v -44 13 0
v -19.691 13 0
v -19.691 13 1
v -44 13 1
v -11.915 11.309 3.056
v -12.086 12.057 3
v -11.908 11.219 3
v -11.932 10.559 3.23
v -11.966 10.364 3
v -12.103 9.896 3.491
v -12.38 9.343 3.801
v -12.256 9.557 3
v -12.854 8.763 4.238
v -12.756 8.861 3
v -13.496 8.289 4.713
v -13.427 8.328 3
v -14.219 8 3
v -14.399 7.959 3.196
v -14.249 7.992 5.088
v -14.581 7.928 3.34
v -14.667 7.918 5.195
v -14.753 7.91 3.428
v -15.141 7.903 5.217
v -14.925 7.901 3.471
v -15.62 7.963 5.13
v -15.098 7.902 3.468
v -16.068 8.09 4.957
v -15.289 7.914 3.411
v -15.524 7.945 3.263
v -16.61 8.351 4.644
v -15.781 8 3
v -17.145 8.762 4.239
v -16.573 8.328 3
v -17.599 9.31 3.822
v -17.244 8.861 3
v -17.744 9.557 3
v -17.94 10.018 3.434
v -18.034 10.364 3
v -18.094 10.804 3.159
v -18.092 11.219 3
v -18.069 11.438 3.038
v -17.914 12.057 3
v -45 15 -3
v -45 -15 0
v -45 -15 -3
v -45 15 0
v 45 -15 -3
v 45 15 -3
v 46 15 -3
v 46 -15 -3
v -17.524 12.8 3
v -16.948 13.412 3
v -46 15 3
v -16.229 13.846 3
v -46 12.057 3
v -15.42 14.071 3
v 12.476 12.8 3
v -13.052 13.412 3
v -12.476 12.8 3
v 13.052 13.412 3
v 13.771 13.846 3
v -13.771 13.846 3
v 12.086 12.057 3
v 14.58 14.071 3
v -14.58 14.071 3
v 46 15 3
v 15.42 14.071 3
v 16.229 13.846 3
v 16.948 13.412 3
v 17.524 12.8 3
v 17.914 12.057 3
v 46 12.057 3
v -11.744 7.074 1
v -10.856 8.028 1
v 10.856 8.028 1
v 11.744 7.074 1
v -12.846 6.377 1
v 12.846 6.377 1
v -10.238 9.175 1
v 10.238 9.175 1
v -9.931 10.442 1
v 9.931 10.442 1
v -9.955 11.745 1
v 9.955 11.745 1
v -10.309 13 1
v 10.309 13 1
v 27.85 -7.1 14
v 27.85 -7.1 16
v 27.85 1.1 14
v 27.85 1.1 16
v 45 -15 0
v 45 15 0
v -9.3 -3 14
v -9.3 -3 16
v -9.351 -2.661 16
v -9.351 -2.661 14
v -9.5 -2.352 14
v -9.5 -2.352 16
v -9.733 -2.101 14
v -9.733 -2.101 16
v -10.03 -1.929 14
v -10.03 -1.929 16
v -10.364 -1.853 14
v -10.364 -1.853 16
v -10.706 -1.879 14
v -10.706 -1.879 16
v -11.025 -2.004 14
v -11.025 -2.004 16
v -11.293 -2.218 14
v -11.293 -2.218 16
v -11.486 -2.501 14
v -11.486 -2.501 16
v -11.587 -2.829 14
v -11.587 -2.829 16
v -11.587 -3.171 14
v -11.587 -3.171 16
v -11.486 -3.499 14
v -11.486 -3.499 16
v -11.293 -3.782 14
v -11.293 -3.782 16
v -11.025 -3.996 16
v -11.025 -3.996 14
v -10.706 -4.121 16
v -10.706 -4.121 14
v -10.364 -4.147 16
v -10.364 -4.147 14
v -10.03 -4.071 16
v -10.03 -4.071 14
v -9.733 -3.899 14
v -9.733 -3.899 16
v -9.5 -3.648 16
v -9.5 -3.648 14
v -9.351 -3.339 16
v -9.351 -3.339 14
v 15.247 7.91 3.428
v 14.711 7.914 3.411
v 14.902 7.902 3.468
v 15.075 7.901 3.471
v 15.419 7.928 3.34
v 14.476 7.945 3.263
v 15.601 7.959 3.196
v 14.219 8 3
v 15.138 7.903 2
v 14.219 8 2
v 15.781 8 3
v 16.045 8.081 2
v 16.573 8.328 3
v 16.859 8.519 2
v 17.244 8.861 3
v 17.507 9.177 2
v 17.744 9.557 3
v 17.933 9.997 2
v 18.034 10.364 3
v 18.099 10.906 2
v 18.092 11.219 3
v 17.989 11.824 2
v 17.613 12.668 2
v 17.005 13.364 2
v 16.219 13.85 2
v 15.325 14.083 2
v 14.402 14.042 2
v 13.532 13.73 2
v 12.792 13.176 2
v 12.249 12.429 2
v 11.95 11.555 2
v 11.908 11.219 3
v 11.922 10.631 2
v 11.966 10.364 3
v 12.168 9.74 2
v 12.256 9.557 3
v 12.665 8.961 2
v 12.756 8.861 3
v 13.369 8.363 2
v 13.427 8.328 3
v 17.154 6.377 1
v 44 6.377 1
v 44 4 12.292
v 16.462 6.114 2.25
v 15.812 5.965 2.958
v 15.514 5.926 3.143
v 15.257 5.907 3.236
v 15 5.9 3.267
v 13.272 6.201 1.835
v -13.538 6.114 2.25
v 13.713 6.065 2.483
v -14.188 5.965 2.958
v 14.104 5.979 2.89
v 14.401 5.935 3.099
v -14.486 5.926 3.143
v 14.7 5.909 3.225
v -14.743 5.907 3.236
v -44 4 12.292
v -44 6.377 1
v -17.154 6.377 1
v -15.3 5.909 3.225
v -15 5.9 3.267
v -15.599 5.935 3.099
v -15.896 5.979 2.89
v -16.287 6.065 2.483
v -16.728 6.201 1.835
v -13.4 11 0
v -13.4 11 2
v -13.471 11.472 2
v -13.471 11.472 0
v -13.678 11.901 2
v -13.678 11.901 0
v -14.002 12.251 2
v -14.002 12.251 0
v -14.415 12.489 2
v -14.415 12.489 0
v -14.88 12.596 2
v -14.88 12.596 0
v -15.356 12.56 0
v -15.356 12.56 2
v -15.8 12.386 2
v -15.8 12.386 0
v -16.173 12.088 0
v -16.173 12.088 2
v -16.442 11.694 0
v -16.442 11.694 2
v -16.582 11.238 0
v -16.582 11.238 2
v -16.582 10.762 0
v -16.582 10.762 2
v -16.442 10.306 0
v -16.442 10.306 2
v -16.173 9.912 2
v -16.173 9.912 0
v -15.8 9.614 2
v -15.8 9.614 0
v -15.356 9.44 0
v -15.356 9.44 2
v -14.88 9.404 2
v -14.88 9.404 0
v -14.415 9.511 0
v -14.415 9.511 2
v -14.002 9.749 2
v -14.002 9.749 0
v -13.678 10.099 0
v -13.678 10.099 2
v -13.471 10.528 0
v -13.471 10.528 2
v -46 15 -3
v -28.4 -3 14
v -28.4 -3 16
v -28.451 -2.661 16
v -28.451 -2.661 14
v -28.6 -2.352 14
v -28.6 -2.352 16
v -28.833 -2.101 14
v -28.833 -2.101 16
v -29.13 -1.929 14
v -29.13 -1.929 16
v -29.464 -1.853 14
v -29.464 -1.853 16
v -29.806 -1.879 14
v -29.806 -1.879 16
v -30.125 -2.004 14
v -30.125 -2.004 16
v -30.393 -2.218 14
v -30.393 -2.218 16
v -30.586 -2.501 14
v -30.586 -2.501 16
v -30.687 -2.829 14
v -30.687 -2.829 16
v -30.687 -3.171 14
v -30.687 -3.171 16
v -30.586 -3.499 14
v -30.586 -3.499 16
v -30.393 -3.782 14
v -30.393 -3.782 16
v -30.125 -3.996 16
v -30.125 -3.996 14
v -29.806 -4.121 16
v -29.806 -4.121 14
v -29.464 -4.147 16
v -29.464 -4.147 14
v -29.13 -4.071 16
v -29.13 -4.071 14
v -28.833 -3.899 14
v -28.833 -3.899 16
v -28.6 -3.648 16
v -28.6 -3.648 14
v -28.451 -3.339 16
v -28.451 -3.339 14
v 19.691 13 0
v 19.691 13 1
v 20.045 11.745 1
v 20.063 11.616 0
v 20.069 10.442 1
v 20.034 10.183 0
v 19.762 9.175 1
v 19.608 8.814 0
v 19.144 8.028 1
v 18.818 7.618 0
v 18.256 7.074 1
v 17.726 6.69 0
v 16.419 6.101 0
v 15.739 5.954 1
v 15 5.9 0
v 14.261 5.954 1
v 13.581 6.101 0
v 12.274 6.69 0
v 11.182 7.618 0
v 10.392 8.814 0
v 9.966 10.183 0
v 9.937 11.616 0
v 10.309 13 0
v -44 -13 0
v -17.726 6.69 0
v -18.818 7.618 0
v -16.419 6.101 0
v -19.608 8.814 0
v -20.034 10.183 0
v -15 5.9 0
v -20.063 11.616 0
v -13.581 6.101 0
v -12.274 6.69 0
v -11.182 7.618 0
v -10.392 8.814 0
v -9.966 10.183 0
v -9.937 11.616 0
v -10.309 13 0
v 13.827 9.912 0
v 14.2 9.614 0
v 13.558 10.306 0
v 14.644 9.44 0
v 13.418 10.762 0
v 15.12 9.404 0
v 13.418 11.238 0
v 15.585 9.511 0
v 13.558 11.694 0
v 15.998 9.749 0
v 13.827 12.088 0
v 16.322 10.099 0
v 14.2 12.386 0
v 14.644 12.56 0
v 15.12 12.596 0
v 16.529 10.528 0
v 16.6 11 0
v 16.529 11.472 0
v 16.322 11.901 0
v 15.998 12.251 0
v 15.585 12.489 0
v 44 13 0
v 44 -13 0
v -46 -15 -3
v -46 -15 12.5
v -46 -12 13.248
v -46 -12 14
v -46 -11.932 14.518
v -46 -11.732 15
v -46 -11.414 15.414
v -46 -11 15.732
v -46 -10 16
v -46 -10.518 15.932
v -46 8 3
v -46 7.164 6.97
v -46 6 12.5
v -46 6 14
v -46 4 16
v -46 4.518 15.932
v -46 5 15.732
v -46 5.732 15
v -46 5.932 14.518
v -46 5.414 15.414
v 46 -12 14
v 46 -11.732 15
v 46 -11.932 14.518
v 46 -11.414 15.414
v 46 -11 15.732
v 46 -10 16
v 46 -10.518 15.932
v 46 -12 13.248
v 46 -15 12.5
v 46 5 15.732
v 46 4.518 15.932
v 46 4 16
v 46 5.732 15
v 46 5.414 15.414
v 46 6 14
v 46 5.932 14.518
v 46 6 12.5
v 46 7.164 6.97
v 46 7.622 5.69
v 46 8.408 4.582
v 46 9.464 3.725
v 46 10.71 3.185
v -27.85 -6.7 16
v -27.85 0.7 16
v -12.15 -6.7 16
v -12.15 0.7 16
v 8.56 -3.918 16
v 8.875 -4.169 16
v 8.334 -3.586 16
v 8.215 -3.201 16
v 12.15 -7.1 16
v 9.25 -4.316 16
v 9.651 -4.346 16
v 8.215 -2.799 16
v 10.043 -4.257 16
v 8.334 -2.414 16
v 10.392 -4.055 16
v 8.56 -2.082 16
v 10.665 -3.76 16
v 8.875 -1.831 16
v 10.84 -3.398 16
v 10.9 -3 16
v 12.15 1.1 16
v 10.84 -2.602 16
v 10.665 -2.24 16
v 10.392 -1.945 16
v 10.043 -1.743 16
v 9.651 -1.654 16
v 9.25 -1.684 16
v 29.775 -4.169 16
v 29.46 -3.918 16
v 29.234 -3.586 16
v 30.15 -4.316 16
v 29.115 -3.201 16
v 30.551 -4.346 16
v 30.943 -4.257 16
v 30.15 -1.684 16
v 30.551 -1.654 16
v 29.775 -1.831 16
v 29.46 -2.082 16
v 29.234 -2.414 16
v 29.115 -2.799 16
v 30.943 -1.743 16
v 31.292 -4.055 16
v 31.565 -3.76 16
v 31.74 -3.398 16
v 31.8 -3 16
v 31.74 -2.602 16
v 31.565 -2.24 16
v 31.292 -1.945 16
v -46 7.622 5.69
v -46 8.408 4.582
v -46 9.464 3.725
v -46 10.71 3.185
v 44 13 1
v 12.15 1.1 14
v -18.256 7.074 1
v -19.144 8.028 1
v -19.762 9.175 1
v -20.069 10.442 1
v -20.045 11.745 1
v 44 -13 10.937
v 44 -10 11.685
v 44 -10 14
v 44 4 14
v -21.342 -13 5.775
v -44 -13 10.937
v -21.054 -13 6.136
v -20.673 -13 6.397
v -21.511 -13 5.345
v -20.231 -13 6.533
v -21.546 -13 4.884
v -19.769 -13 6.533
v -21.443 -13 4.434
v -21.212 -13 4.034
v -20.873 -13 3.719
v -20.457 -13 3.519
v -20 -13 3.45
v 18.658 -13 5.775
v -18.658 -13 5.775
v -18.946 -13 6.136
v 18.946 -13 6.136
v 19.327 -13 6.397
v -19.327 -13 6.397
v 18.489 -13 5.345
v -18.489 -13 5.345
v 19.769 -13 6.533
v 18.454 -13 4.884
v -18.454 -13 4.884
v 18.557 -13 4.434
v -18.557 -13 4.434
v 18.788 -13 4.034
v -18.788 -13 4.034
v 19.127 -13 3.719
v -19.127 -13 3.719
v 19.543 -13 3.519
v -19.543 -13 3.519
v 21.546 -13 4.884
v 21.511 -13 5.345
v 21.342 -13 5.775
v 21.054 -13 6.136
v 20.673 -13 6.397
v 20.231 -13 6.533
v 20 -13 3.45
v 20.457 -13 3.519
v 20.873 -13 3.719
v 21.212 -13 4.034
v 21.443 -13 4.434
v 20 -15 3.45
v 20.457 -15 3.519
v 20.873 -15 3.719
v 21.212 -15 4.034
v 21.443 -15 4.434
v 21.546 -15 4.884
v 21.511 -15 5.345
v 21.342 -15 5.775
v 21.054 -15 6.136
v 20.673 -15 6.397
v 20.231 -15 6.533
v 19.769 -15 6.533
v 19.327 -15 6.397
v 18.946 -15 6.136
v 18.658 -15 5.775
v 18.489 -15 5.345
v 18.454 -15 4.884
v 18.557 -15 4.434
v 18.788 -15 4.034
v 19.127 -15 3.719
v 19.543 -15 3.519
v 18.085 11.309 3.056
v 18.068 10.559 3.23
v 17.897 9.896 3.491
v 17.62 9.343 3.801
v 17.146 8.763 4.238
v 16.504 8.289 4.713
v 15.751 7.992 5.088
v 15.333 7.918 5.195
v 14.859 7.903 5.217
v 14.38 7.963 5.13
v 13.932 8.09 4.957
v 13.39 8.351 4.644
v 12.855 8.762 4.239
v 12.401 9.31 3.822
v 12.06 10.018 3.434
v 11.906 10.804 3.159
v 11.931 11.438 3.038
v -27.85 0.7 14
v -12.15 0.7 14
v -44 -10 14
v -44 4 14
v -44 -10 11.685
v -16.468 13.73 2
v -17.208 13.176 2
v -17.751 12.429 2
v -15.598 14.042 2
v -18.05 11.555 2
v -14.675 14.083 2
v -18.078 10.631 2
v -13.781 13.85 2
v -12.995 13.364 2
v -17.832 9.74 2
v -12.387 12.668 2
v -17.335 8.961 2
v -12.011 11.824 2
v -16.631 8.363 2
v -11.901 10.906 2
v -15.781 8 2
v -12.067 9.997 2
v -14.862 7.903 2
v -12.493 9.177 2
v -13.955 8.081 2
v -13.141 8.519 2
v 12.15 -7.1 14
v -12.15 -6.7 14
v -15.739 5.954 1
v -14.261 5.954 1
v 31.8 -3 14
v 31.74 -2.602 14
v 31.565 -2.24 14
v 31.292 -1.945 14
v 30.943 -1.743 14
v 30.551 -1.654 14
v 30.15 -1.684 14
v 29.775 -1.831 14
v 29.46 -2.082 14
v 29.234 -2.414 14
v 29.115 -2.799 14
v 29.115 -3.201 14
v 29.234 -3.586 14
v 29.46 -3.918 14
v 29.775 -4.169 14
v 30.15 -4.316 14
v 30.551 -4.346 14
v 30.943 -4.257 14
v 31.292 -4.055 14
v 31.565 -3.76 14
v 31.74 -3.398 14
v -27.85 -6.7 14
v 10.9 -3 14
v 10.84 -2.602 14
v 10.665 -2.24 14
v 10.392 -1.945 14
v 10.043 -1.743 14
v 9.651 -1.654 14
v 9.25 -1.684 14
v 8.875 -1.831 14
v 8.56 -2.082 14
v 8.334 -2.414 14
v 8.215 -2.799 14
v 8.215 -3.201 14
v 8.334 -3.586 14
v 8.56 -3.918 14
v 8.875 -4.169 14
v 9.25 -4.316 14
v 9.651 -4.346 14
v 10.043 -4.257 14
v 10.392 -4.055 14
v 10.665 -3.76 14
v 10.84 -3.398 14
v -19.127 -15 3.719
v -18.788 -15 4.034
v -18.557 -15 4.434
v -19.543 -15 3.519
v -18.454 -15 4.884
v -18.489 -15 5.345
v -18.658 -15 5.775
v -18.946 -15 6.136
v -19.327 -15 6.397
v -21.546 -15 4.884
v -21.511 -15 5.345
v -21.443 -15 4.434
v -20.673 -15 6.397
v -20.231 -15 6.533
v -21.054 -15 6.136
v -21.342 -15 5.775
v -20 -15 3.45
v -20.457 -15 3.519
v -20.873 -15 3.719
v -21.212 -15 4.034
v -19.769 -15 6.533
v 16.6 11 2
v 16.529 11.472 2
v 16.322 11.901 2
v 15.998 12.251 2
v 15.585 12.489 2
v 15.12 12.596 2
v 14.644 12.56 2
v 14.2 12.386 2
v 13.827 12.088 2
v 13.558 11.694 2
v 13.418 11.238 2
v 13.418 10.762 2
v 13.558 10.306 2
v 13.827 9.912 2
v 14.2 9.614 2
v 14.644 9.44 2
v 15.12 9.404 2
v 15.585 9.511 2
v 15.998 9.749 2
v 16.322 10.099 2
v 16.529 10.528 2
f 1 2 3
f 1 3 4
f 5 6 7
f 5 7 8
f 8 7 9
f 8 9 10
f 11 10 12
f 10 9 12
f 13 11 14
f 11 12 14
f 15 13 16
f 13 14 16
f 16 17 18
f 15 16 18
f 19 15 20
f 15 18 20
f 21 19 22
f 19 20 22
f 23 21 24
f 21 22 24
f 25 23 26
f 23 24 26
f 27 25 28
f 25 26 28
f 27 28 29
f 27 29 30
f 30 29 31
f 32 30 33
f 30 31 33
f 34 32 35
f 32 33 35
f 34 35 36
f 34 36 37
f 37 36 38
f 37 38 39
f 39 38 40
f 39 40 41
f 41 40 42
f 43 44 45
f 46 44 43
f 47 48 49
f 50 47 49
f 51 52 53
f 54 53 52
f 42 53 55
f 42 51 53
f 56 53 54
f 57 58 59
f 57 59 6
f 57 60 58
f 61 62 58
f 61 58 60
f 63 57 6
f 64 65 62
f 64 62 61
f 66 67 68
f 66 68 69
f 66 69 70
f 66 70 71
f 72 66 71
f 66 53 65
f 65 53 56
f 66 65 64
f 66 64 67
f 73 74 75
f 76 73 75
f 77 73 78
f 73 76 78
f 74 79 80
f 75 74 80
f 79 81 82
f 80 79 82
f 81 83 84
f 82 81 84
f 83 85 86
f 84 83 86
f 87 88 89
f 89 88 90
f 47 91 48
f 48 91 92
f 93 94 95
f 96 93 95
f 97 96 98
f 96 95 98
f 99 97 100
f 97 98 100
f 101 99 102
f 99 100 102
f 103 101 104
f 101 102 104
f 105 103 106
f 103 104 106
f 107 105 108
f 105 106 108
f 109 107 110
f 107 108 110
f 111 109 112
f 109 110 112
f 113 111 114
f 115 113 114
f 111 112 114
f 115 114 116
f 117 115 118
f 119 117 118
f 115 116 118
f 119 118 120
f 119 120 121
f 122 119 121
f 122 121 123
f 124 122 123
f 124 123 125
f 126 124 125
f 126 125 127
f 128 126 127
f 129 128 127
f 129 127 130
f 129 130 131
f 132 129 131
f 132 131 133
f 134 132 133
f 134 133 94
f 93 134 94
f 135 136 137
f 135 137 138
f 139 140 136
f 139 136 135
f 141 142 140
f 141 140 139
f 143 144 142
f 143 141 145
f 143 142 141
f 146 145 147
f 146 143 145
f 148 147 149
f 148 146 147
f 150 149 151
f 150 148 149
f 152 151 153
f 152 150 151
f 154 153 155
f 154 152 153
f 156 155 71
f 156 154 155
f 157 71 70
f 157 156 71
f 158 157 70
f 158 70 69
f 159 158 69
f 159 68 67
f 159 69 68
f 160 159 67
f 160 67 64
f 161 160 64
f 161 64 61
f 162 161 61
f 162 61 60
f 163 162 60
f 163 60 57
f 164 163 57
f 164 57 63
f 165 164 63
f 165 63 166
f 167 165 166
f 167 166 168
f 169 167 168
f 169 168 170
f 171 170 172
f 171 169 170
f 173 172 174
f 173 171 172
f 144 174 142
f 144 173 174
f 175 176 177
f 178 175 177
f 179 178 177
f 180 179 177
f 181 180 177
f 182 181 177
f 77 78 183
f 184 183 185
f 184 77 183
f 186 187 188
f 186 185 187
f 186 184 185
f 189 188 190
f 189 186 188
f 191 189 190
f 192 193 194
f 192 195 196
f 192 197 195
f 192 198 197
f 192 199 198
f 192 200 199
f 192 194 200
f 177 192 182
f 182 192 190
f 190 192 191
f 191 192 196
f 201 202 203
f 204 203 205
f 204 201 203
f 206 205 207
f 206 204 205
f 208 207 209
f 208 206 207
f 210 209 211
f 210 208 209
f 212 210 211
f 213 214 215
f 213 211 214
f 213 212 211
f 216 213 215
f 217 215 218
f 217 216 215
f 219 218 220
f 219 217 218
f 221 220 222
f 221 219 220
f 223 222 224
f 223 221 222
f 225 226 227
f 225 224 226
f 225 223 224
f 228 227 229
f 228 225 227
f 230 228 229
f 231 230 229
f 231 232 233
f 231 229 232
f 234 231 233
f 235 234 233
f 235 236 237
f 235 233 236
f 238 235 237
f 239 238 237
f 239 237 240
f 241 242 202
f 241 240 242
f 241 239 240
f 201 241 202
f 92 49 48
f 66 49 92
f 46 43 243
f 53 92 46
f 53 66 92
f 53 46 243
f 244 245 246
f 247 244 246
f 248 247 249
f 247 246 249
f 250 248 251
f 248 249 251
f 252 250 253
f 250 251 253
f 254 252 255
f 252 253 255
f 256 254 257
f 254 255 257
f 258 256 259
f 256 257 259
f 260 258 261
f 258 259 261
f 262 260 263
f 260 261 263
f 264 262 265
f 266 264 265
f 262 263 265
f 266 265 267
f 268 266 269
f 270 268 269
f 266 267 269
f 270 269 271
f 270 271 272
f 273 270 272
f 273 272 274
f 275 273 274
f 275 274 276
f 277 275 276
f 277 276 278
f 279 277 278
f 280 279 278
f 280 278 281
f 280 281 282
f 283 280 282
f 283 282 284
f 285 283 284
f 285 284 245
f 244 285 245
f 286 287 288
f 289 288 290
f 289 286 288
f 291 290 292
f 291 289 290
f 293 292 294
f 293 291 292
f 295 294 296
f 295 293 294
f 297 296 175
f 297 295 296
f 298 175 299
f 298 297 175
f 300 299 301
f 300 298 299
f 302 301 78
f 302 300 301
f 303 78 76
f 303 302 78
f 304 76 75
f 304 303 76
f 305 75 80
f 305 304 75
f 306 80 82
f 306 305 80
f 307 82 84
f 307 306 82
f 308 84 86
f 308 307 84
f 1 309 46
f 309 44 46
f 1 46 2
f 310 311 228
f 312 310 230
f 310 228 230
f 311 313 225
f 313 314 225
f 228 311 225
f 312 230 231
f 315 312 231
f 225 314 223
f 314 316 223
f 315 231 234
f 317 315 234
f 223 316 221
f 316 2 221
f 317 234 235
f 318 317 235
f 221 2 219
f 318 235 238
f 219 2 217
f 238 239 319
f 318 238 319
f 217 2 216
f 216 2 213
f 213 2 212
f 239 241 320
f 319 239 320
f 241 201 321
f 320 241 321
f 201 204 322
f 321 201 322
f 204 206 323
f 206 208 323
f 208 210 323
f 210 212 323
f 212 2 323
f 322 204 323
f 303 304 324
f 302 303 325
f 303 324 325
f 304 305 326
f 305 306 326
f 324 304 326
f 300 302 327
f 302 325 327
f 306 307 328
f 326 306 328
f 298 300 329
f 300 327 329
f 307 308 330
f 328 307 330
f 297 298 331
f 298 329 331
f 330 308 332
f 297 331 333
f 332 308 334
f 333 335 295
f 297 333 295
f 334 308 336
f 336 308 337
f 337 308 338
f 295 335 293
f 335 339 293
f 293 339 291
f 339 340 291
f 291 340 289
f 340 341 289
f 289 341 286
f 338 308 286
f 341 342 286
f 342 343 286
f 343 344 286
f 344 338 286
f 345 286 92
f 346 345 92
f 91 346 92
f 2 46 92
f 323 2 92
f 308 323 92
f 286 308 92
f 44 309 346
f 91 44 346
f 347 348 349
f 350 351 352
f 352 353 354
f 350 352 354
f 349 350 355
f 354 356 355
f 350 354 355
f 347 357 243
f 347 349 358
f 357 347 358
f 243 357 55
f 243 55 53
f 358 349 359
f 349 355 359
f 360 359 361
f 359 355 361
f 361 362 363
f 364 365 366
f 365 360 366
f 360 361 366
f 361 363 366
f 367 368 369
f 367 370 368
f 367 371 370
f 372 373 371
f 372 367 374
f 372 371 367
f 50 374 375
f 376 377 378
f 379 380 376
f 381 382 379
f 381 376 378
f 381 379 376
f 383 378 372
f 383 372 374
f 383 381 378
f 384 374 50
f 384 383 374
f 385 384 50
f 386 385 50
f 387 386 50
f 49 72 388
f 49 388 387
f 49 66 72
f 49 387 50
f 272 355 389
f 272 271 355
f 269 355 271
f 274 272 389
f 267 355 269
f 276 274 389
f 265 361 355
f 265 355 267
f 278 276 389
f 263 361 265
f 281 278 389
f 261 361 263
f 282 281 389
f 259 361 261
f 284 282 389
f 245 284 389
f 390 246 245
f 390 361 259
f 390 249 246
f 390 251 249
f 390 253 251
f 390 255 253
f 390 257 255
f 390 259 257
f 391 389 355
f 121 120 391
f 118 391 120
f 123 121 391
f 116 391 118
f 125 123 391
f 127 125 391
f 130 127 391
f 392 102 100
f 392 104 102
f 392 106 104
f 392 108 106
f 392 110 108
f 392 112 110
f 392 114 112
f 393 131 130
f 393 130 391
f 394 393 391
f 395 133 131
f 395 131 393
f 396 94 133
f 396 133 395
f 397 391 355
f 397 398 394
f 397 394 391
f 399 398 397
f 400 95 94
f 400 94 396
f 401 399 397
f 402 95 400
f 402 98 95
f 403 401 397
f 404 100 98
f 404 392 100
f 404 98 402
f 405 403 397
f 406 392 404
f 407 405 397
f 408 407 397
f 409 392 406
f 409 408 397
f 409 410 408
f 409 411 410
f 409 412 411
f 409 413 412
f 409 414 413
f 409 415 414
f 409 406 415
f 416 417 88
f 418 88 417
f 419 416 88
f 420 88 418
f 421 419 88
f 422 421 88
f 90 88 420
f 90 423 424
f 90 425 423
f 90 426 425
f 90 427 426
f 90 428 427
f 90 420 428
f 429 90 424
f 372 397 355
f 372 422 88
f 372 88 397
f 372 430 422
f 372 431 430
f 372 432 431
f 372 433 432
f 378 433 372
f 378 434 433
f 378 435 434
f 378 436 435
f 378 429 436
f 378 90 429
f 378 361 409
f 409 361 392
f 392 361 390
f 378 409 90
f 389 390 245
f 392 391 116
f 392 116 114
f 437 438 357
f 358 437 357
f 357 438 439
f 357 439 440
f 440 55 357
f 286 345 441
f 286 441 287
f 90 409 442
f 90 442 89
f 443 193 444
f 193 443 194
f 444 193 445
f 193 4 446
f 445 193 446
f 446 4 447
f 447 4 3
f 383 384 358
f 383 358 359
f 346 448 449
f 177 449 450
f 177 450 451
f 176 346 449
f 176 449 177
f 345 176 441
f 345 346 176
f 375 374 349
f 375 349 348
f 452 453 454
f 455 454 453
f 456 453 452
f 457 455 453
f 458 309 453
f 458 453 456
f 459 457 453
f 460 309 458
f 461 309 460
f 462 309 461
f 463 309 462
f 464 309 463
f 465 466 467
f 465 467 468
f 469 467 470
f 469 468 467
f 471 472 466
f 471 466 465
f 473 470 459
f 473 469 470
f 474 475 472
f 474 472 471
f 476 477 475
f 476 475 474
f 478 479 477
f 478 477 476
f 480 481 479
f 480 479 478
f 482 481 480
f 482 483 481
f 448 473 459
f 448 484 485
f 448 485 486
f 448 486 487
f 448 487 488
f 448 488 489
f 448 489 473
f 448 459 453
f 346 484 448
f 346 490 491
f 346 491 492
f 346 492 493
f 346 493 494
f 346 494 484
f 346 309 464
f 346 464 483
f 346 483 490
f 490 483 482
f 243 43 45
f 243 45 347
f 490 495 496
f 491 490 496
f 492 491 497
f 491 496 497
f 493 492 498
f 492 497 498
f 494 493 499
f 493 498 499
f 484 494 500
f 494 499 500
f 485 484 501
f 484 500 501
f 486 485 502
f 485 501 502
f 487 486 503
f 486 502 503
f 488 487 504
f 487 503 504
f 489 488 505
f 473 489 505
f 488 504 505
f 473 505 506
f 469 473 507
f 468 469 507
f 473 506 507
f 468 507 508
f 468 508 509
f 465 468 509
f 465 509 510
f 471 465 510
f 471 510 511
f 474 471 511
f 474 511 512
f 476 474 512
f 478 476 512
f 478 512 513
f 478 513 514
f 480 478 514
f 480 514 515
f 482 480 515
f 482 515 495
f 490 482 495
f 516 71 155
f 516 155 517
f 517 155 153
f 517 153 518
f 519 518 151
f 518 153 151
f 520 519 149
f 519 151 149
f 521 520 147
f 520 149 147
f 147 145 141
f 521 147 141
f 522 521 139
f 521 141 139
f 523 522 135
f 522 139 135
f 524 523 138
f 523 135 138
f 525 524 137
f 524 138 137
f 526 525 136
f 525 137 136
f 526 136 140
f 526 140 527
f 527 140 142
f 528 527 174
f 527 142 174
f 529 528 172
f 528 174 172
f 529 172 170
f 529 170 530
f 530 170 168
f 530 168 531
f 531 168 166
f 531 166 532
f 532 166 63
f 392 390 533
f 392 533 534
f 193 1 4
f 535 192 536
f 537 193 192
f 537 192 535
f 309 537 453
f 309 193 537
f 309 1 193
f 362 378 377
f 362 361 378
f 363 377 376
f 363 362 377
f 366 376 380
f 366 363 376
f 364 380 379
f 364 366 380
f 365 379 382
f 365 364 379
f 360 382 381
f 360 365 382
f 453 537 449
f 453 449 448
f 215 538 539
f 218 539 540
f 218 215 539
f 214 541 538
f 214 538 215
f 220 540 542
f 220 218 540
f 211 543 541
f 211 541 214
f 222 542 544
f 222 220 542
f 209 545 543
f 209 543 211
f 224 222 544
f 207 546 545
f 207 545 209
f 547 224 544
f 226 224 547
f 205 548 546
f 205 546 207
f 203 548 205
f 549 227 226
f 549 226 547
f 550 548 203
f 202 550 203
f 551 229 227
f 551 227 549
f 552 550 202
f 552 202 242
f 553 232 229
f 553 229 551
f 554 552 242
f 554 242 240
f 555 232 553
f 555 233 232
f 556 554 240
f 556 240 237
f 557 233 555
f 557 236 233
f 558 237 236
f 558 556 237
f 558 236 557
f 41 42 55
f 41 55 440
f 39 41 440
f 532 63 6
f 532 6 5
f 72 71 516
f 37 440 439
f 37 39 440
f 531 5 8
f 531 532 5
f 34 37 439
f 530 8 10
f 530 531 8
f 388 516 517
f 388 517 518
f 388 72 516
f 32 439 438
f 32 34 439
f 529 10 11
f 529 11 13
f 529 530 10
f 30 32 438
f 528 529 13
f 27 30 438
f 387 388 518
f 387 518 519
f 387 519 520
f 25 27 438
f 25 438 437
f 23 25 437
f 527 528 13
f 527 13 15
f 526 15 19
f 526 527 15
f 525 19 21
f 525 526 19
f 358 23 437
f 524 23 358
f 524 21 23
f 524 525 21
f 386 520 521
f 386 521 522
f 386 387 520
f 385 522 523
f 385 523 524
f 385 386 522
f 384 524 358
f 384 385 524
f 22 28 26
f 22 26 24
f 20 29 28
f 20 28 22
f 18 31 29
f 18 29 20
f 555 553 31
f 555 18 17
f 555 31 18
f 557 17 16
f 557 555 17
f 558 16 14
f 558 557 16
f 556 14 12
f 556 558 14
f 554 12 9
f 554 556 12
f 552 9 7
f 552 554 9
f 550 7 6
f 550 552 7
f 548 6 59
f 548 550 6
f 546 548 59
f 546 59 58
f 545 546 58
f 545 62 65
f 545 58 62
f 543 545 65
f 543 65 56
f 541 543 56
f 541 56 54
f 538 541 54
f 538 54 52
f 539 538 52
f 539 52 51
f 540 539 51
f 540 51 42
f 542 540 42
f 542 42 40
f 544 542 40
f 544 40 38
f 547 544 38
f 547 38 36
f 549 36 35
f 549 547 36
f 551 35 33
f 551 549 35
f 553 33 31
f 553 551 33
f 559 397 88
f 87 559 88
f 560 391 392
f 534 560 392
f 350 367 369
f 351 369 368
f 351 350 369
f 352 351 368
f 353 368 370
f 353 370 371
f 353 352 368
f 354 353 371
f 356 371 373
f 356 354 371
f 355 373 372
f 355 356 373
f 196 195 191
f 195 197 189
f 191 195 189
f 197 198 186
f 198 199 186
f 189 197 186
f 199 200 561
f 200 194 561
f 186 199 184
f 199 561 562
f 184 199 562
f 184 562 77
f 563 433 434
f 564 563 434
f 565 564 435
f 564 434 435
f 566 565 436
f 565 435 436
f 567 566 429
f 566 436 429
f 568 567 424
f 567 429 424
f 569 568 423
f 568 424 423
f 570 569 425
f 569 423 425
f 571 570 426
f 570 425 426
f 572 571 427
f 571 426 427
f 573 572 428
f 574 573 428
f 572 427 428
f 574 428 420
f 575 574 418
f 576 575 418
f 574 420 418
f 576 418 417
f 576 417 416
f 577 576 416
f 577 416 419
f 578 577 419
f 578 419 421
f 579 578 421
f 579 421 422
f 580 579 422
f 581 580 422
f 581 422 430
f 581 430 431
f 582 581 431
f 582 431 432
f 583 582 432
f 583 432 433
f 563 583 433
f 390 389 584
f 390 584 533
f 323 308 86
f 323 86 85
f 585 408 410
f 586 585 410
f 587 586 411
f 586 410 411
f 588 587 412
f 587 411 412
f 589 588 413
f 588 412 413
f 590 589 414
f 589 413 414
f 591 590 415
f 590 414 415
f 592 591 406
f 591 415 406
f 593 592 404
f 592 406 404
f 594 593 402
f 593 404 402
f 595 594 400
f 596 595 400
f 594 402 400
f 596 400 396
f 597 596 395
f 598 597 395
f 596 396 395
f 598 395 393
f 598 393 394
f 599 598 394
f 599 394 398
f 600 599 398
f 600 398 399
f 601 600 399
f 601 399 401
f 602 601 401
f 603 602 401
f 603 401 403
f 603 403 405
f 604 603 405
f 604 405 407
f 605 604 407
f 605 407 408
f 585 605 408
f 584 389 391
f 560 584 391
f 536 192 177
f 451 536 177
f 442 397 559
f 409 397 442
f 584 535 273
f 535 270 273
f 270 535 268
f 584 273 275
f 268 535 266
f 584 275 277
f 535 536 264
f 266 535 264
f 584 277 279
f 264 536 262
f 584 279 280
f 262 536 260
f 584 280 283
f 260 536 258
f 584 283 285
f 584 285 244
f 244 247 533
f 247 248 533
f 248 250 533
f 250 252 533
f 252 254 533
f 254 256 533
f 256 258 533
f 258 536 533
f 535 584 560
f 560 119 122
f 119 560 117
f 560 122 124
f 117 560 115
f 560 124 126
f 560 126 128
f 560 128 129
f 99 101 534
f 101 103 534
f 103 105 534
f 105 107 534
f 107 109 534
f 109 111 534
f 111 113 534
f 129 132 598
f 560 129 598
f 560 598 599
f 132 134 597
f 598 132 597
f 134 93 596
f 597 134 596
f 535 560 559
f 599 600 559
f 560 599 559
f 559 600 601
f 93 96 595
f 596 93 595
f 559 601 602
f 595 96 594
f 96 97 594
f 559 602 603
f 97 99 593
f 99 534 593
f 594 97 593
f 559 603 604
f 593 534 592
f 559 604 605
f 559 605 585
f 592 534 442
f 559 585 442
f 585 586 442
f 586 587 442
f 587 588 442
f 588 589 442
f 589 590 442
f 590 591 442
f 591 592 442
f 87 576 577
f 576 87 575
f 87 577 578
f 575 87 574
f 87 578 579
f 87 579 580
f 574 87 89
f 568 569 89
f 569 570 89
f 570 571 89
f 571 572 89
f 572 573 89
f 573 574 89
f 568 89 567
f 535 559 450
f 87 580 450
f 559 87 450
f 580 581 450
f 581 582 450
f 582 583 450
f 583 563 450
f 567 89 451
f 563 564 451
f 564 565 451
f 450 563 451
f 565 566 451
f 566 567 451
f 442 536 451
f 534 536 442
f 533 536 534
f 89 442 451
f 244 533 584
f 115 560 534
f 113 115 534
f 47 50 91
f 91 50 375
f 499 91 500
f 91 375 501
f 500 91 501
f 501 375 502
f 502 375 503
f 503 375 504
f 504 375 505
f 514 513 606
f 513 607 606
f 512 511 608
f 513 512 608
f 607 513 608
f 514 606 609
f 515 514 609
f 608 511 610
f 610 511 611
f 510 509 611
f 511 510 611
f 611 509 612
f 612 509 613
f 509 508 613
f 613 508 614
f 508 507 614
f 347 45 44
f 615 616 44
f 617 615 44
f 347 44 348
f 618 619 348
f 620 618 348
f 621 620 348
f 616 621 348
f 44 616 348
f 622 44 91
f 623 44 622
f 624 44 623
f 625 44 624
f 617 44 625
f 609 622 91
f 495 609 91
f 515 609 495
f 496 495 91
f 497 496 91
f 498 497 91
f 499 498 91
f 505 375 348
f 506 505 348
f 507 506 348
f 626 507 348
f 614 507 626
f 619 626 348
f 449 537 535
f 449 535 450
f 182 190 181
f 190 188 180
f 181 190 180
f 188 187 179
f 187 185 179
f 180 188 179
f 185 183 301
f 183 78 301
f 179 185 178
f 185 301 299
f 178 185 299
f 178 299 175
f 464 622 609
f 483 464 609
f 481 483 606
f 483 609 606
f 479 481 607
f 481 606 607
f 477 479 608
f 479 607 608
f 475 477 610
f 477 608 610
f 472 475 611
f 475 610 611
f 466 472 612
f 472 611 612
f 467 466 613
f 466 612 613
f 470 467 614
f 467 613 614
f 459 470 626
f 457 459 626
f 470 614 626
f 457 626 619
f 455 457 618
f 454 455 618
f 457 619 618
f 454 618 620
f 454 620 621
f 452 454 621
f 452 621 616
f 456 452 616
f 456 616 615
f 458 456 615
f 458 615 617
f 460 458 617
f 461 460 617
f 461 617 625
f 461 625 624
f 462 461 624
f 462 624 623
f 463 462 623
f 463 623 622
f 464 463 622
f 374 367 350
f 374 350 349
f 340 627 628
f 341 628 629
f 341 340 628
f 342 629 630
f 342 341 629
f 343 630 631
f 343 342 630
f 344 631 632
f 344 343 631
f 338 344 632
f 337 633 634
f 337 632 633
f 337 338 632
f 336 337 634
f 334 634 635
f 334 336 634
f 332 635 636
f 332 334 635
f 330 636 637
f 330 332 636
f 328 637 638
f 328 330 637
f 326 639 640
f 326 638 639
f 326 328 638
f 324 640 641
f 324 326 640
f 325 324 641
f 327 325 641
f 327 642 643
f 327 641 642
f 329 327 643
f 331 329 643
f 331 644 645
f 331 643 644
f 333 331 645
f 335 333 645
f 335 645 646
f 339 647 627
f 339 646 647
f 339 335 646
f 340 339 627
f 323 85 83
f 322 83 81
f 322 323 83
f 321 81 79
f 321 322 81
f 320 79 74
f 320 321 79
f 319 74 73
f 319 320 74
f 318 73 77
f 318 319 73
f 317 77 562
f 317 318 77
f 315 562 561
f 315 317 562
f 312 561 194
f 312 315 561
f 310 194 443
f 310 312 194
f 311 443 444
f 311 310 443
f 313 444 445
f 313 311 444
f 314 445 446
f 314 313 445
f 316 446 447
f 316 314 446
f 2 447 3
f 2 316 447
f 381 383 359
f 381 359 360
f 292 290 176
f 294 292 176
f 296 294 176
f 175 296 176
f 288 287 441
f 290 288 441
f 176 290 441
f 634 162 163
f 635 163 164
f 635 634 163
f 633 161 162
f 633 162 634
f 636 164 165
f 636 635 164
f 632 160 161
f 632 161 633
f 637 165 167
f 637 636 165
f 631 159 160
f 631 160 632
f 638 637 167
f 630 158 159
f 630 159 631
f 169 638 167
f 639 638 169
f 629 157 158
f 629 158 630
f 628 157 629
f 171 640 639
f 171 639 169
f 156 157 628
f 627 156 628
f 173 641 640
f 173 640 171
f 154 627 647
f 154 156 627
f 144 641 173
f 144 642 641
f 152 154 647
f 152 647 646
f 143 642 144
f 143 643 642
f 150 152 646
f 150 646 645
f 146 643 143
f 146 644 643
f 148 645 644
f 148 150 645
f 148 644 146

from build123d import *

# Parameters (mm, degrees)
SKETCH2_W               = 92
SKETCH2_H               = 30
BOSS_EXTRUDE1_DEPTH     = 16
SKETCH3_W               = 1
SKETCH3_H               = 30
BOSS_EXTRUDE2_DEPTH     = 3
SKETCH6_OUTSIDE_W       = 40.724
SKETCH6_OUTSIDE_H       = 51.724
CUT_EXTRUDE1_DEPTH      = 95.578010129
SKETCH7_R               = 1.6
CUT_EXTRUDE2_DEPTH      = 51.960769225
CUT_EXTRUDE3_DEPTH      = 51.0999002
CUT_EXTRUDE3_DEPTH_BACK = 1
SKETCH8_R               = 3.1
SHELL3_OUTLINE_W        = 88
SHELL3_OUTLINE_H        = 14
SHELL3_DEPTH            = 14
SHELL3_2_OUTLINE_W      = 88
SHELL3_2_OUTLINE_H      = 3
SHELL3_2_DEPTH          = 10.937428747
SHELL3_3_DEPTH          = 1
SHELL3_START            = -44
SHELL3_4_DEPTH          = 88
SHELL3_START_2          = 1
SHELL3_5_DEPTH          = 2.266756081
SKETCH9_R               = 1.35
SKETCH9_W               = 15.7
SKETCH9_H               = 8.2
CUT_EXTRUDE4_DEPTH      = 52.980765673
SKETCH10_R              = 1.15
SKETCH10_W              = 15.7
SKETCH10_H              = 7.4
CUT_EXTRUDE5_DEPTH      = 52.980765673
SKETCH11_R              = 1.55
CUT_EXTRUDE6_DEPTH      = 10
FILLET1_R               = 2
FILLET3_R               = 5


with BuildPart() as part:
    # Sketch2 → Boss-Extrude1 (new body)
    with BuildSketch(Plane.XY):
        Rectangle(SKETCH2_W, SKETCH2_H)
    extrude(amount=BOSS_EXTRUDE1_DEPTH)

    # Sketch3 → Boss-Extrude2 (add)
    with BuildSketch(Plane.XY):
        with Locations((45.5, 0)):
            Rectangle(SKETCH3_W, SKETCH3_H)
    boss_extrude2 = extrude(amount=-BOSS_EXTRUDE2_DEPTH)

    # Mirror1: Boss-Extrude2 across plane
    add(boss_extrude2.mirror(Plane(origin=(0, 0, 0), x_dir=(0, 0, 1), z_dir=(1, 0, 0))))

    # Sketch6 outside → Cut-Extrude1 (cut, through all)
    with BuildSketch(Plane(origin=(46, 0, 0), x_dir=(0, 0, -1), z_dir=(1, 0, 0))):
        with Locations((-6.5, 0)):
            Rectangle(SKETCH6_OUTSIDE_W, SKETCH6_OUTSIDE_H)
        Polygon((-12.5, 6), (-16, 6), (-16, -12), (-13.247984009, -12), (-12.5, -15), (3, -15), (3, 15), (-3, 15), (-3, 8), align=None, mode=Mode.SUBTRACT)
    extrude(amount=-CUT_EXTRUDE1_DEPTH, mode=Mode.SUBTRACT)

    # Sketch7 → Cut-Extrude2 (cut, through all)
    with BuildSketch(Plane.XY):
        with Locations((-15, 11)):
            Circle(SKETCH7_R)
        with Locations((15, 11)):
            Circle(SKETCH7_R)
    extrude(amount=CUT_EXTRUDE2_DEPTH, mode=Mode.SUBTRACT)

    # Sketch8 → Cut-Extrude3 (cut, two sides: drawn at the far end of the back side and taken through both)
    with BuildSketch(Plane.XY.offset(3).offset(-CUT_EXTRUDE3_DEPTH_BACK)):
        with Locations(Location((15, 11, 0), (0, 0, 255.407449398))):
            Circle(SKETCH8_R)
        with Locations(Location((-15, 11, 0), (0, 0, 255.407449398))):
            Circle(SKETCH8_R)
    extrude(amount=CUT_EXTRUDE3_DEPTH + CUT_EXTRUDE3_DEPTH_BACK, mode=Mode.SUBTRACT)

    # Shell3: read off the stored shape, not the designer's step
    # Shell3 outline → Shell3 (cut)
    with BuildSketch(Plane.XY):
        with Locations((0, -3)):
            Rectangle(SHELL3_OUTLINE_W, SHELL3_OUTLINE_H)
    extrude(amount=SHELL3_DEPTH, mode=Mode.SUBTRACT)

    # Shell3 2 outline → Shell3 2 (cut)
    with BuildSketch(Plane.XY):
        with Locations((0, -11.5)):
            Rectangle(SHELL3_2_OUTLINE_W, SHELL3_2_OUTLINE_H)
    extrude(amount=SHELL3_2_DEPTH, mode=Mode.SUBTRACT)

    # Shell3 3 outline → Shell3 3 (cut)
    with BuildSketch(Plane.XY):
        with BuildLine():
            Line((-19.691481642, 13), (-44, 13))
            Line((-44, 13), (-44, 4))
            Line((-44, 4), (44, 4))
            Line((44, 4), (44, 13))
            Line((44, 13), (19.691481642, 13))
            ThreePointArc((19.691481642, 13), (15, 5.9), (10.308518358, 13))
            Line((10.308518358, 13), (-10.308518358, 13))
            ThreePointArc((-10.308518358, 13), (-15, 5.9), (-19.691481642, 13))
        make_face()
    extrude(amount=SHELL3_3_DEPTH, mode=Mode.SUBTRACT)

    # Shell3 4 outline → Shell3 4 (cut)
    with BuildSketch(Plane.YZ.offset(SHELL3_START)):
        Polygon((4, 1), (6.377211806, 1), (4, 12.291756081), align=None)
        Polygon((-10, 10.937428747), (-10, 11.685412756), (-13, 10.937428747), align=None)
    extrude(amount=SHELL3_4_DEPTH, mode=Mode.SUBTRACT)

    # Shell3 5 outline → Shell3 5 (add)
    with BuildSketch(Plane.XY.offset(SHELL3_START_2)):
        with BuildLine():
            Line((17.154026303, 6.377211806), (12.845973697, 6.377211806))
            ThreePointArc((12.845973697, 6.377211806), (15, 5.9), (17.154026303, 6.377211806))
        make_face()
        with BuildLine():
            ThreePointArc((-17.154026303, 6.377211806), (-15, 5.9), (-12.845973697, 6.377211806))
            Line((-12.845973697, 6.377211806), (-17.154026303, 6.377211806))
        make_face()
    extrude(amount=SHELL3_5_DEPTH)

    # Sketch9 → Cut-Extrude4 (cut, through all)
    with BuildSketch(Plane.XY.offset(16)):
        with Locations((9.55, -3)):
            Circle(SKETCH9_R)
        with Locations((30.45, -3)):
            Circle(SKETCH9_R)
        with Locations((20, -3)):
            Rectangle(SKETCH9_W, SKETCH9_H)
    extrude(amount=-CUT_EXTRUDE4_DEPTH, mode=Mode.SUBTRACT)

    # Sketch10 → Cut-Extrude5 (cut, through all)
    with BuildSketch(Plane.XY.offset(16)):
        with Locations((-29.55, -3)):
            Circle(SKETCH10_R)
        with Locations((-10.45, -3)):
            Circle(SKETCH10_R)
        with Locations((-20, -3)):
            Rectangle(SKETCH10_W, SKETCH10_H)
    extrude(amount=-CUT_EXTRUDE5_DEPTH, mode=Mode.SUBTRACT)

    # Sketch11 → Cut-Extrude6 (cut)
    with BuildSketch(Plane.XZ.offset(15)):
        with Locations(Location((-20, 5, 0), (0, 0, 270))):
            Circle(SKETCH11_R)
        with Locations(Location((20, 5, 0), (0, 0, 270))):
            Circle(SKETCH11_R)
    extrude(amount=-CUT_EXTRUDE6_DEPTH, mode=Mode.SUBTRACT)

    # Fillet1
    fillet1_edges = [part.edges().sort_by_distance(p)[0] for p in [
        (0, -12, 16),
        (0, 6, 16),
    ]]
    fillet(fillet1_edges, radius=FILLET1_R)

    # Fillet3
    # the kernel refuses this fillet: 5 mm, written as the material it adds along each edge
    with BuildSketch(Plane(origin=(24.361401242, 8, 3), x_dir=(0, -0.20601048104984168, 0.978549784986749), z_dir=(-1, 0, 0))) as fillet3_piece_1_section:
        with BuildLine():
            CenterArc((FILLET3_R * 0.811394096787, FILLET3_R), FILLET3_R, 191.88865804, 78.11134196)
            Line((-FILLET3_R * 0.1671556882, FILLET3_R * 0.79398951895), (0, 0))
            Line((0, 0), (FILLET3_R * 0.811394096787, 0))
        make_face()
    fillet3_piece_1 = extrude(amount=48.722802484, mode=Mode.PRIVATE)
    fillet3_piece_1 = fillet3_piece_1 - Plane(origin=(-15, 11, 3), x_dir=(-0.2519435379319081, -0.967741935484018, 0), z_dir=(0, 0, -1)) * Cylinder(3.1, 114, mode=Mode.PRIVATE)
    fillet3_piece_1 = fillet3_piece_1 - Plane(origin=(15, 11, 3), x_dir=(-0.2519435379319081, -0.967741935484018, 0), z_dir=(0, 0, -1)) * Cylinder(3.1, 114, mode=Mode.PRIVATE)
    add(fillet3_piece_1)
    with BuildSketch(Plane(origin=(46, 8, 3), x_dir=(0, -0.20601048104984168, 0.978549784986749), z_dir=(-1, 0, 0))) as fillet3_piece_2_section:
        with BuildLine():
            CenterArc((FILLET3_R * 0.811394096787, FILLET3_R), FILLET3_R, 191.88865804, 78.11134196)
            Line((-FILLET3_R * 0.1671556882, FILLET3_R * 0.79398951895), (0, 0))
            Line((0, 0), (FILLET3_R * 0.811394096787, 0))
        make_face()
    fillet3_piece_2 = extrude(amount=40.361401242, mode=Mode.PRIVATE)
    fillet3_piece_2 = fillet3_piece_2 - Plane(origin=(15, 11, 3), x_dir=(-0.2519435379319081, -0.967741935484018, 0), z_dir=(0, 0, -1)) * Cylinder(3.1, 97, mode=Mode.PRIVATE)
    add(fillet3_piece_2)
    with BuildSketch(Plane(origin=(-5.638598758, 8, 3), x_dir=(0, -0.20601048104984168, 0.978549784986749), z_dir=(-1, 0, 0))) as fillet3_piece_3_section:
        with BuildLine():
            CenterArc((FILLET3_R * 0.811394096787, FILLET3_R), FILLET3_R, 191.88865804, 78.11134196)
            Line((-FILLET3_R * 0.1671556882, FILLET3_R * 0.79398951895), (0, 0))
            Line((0, 0), (FILLET3_R * 0.811394096787, 0))
        make_face()
    fillet3_piece_3 = extrude(amount=40.361401242, mode=Mode.PRIVATE)
    fillet3_piece_3 = fillet3_piece_3 - Plane(origin=(-15, 11, 3), x_dir=(-0.2519435379319081, -0.967741935484018, 0), z_dir=(0, 0, -1)) * Cylinder(3.1, 97, mode=Mode.PRIVATE)
    add(fillet3_piece_3)


solid = part.part
